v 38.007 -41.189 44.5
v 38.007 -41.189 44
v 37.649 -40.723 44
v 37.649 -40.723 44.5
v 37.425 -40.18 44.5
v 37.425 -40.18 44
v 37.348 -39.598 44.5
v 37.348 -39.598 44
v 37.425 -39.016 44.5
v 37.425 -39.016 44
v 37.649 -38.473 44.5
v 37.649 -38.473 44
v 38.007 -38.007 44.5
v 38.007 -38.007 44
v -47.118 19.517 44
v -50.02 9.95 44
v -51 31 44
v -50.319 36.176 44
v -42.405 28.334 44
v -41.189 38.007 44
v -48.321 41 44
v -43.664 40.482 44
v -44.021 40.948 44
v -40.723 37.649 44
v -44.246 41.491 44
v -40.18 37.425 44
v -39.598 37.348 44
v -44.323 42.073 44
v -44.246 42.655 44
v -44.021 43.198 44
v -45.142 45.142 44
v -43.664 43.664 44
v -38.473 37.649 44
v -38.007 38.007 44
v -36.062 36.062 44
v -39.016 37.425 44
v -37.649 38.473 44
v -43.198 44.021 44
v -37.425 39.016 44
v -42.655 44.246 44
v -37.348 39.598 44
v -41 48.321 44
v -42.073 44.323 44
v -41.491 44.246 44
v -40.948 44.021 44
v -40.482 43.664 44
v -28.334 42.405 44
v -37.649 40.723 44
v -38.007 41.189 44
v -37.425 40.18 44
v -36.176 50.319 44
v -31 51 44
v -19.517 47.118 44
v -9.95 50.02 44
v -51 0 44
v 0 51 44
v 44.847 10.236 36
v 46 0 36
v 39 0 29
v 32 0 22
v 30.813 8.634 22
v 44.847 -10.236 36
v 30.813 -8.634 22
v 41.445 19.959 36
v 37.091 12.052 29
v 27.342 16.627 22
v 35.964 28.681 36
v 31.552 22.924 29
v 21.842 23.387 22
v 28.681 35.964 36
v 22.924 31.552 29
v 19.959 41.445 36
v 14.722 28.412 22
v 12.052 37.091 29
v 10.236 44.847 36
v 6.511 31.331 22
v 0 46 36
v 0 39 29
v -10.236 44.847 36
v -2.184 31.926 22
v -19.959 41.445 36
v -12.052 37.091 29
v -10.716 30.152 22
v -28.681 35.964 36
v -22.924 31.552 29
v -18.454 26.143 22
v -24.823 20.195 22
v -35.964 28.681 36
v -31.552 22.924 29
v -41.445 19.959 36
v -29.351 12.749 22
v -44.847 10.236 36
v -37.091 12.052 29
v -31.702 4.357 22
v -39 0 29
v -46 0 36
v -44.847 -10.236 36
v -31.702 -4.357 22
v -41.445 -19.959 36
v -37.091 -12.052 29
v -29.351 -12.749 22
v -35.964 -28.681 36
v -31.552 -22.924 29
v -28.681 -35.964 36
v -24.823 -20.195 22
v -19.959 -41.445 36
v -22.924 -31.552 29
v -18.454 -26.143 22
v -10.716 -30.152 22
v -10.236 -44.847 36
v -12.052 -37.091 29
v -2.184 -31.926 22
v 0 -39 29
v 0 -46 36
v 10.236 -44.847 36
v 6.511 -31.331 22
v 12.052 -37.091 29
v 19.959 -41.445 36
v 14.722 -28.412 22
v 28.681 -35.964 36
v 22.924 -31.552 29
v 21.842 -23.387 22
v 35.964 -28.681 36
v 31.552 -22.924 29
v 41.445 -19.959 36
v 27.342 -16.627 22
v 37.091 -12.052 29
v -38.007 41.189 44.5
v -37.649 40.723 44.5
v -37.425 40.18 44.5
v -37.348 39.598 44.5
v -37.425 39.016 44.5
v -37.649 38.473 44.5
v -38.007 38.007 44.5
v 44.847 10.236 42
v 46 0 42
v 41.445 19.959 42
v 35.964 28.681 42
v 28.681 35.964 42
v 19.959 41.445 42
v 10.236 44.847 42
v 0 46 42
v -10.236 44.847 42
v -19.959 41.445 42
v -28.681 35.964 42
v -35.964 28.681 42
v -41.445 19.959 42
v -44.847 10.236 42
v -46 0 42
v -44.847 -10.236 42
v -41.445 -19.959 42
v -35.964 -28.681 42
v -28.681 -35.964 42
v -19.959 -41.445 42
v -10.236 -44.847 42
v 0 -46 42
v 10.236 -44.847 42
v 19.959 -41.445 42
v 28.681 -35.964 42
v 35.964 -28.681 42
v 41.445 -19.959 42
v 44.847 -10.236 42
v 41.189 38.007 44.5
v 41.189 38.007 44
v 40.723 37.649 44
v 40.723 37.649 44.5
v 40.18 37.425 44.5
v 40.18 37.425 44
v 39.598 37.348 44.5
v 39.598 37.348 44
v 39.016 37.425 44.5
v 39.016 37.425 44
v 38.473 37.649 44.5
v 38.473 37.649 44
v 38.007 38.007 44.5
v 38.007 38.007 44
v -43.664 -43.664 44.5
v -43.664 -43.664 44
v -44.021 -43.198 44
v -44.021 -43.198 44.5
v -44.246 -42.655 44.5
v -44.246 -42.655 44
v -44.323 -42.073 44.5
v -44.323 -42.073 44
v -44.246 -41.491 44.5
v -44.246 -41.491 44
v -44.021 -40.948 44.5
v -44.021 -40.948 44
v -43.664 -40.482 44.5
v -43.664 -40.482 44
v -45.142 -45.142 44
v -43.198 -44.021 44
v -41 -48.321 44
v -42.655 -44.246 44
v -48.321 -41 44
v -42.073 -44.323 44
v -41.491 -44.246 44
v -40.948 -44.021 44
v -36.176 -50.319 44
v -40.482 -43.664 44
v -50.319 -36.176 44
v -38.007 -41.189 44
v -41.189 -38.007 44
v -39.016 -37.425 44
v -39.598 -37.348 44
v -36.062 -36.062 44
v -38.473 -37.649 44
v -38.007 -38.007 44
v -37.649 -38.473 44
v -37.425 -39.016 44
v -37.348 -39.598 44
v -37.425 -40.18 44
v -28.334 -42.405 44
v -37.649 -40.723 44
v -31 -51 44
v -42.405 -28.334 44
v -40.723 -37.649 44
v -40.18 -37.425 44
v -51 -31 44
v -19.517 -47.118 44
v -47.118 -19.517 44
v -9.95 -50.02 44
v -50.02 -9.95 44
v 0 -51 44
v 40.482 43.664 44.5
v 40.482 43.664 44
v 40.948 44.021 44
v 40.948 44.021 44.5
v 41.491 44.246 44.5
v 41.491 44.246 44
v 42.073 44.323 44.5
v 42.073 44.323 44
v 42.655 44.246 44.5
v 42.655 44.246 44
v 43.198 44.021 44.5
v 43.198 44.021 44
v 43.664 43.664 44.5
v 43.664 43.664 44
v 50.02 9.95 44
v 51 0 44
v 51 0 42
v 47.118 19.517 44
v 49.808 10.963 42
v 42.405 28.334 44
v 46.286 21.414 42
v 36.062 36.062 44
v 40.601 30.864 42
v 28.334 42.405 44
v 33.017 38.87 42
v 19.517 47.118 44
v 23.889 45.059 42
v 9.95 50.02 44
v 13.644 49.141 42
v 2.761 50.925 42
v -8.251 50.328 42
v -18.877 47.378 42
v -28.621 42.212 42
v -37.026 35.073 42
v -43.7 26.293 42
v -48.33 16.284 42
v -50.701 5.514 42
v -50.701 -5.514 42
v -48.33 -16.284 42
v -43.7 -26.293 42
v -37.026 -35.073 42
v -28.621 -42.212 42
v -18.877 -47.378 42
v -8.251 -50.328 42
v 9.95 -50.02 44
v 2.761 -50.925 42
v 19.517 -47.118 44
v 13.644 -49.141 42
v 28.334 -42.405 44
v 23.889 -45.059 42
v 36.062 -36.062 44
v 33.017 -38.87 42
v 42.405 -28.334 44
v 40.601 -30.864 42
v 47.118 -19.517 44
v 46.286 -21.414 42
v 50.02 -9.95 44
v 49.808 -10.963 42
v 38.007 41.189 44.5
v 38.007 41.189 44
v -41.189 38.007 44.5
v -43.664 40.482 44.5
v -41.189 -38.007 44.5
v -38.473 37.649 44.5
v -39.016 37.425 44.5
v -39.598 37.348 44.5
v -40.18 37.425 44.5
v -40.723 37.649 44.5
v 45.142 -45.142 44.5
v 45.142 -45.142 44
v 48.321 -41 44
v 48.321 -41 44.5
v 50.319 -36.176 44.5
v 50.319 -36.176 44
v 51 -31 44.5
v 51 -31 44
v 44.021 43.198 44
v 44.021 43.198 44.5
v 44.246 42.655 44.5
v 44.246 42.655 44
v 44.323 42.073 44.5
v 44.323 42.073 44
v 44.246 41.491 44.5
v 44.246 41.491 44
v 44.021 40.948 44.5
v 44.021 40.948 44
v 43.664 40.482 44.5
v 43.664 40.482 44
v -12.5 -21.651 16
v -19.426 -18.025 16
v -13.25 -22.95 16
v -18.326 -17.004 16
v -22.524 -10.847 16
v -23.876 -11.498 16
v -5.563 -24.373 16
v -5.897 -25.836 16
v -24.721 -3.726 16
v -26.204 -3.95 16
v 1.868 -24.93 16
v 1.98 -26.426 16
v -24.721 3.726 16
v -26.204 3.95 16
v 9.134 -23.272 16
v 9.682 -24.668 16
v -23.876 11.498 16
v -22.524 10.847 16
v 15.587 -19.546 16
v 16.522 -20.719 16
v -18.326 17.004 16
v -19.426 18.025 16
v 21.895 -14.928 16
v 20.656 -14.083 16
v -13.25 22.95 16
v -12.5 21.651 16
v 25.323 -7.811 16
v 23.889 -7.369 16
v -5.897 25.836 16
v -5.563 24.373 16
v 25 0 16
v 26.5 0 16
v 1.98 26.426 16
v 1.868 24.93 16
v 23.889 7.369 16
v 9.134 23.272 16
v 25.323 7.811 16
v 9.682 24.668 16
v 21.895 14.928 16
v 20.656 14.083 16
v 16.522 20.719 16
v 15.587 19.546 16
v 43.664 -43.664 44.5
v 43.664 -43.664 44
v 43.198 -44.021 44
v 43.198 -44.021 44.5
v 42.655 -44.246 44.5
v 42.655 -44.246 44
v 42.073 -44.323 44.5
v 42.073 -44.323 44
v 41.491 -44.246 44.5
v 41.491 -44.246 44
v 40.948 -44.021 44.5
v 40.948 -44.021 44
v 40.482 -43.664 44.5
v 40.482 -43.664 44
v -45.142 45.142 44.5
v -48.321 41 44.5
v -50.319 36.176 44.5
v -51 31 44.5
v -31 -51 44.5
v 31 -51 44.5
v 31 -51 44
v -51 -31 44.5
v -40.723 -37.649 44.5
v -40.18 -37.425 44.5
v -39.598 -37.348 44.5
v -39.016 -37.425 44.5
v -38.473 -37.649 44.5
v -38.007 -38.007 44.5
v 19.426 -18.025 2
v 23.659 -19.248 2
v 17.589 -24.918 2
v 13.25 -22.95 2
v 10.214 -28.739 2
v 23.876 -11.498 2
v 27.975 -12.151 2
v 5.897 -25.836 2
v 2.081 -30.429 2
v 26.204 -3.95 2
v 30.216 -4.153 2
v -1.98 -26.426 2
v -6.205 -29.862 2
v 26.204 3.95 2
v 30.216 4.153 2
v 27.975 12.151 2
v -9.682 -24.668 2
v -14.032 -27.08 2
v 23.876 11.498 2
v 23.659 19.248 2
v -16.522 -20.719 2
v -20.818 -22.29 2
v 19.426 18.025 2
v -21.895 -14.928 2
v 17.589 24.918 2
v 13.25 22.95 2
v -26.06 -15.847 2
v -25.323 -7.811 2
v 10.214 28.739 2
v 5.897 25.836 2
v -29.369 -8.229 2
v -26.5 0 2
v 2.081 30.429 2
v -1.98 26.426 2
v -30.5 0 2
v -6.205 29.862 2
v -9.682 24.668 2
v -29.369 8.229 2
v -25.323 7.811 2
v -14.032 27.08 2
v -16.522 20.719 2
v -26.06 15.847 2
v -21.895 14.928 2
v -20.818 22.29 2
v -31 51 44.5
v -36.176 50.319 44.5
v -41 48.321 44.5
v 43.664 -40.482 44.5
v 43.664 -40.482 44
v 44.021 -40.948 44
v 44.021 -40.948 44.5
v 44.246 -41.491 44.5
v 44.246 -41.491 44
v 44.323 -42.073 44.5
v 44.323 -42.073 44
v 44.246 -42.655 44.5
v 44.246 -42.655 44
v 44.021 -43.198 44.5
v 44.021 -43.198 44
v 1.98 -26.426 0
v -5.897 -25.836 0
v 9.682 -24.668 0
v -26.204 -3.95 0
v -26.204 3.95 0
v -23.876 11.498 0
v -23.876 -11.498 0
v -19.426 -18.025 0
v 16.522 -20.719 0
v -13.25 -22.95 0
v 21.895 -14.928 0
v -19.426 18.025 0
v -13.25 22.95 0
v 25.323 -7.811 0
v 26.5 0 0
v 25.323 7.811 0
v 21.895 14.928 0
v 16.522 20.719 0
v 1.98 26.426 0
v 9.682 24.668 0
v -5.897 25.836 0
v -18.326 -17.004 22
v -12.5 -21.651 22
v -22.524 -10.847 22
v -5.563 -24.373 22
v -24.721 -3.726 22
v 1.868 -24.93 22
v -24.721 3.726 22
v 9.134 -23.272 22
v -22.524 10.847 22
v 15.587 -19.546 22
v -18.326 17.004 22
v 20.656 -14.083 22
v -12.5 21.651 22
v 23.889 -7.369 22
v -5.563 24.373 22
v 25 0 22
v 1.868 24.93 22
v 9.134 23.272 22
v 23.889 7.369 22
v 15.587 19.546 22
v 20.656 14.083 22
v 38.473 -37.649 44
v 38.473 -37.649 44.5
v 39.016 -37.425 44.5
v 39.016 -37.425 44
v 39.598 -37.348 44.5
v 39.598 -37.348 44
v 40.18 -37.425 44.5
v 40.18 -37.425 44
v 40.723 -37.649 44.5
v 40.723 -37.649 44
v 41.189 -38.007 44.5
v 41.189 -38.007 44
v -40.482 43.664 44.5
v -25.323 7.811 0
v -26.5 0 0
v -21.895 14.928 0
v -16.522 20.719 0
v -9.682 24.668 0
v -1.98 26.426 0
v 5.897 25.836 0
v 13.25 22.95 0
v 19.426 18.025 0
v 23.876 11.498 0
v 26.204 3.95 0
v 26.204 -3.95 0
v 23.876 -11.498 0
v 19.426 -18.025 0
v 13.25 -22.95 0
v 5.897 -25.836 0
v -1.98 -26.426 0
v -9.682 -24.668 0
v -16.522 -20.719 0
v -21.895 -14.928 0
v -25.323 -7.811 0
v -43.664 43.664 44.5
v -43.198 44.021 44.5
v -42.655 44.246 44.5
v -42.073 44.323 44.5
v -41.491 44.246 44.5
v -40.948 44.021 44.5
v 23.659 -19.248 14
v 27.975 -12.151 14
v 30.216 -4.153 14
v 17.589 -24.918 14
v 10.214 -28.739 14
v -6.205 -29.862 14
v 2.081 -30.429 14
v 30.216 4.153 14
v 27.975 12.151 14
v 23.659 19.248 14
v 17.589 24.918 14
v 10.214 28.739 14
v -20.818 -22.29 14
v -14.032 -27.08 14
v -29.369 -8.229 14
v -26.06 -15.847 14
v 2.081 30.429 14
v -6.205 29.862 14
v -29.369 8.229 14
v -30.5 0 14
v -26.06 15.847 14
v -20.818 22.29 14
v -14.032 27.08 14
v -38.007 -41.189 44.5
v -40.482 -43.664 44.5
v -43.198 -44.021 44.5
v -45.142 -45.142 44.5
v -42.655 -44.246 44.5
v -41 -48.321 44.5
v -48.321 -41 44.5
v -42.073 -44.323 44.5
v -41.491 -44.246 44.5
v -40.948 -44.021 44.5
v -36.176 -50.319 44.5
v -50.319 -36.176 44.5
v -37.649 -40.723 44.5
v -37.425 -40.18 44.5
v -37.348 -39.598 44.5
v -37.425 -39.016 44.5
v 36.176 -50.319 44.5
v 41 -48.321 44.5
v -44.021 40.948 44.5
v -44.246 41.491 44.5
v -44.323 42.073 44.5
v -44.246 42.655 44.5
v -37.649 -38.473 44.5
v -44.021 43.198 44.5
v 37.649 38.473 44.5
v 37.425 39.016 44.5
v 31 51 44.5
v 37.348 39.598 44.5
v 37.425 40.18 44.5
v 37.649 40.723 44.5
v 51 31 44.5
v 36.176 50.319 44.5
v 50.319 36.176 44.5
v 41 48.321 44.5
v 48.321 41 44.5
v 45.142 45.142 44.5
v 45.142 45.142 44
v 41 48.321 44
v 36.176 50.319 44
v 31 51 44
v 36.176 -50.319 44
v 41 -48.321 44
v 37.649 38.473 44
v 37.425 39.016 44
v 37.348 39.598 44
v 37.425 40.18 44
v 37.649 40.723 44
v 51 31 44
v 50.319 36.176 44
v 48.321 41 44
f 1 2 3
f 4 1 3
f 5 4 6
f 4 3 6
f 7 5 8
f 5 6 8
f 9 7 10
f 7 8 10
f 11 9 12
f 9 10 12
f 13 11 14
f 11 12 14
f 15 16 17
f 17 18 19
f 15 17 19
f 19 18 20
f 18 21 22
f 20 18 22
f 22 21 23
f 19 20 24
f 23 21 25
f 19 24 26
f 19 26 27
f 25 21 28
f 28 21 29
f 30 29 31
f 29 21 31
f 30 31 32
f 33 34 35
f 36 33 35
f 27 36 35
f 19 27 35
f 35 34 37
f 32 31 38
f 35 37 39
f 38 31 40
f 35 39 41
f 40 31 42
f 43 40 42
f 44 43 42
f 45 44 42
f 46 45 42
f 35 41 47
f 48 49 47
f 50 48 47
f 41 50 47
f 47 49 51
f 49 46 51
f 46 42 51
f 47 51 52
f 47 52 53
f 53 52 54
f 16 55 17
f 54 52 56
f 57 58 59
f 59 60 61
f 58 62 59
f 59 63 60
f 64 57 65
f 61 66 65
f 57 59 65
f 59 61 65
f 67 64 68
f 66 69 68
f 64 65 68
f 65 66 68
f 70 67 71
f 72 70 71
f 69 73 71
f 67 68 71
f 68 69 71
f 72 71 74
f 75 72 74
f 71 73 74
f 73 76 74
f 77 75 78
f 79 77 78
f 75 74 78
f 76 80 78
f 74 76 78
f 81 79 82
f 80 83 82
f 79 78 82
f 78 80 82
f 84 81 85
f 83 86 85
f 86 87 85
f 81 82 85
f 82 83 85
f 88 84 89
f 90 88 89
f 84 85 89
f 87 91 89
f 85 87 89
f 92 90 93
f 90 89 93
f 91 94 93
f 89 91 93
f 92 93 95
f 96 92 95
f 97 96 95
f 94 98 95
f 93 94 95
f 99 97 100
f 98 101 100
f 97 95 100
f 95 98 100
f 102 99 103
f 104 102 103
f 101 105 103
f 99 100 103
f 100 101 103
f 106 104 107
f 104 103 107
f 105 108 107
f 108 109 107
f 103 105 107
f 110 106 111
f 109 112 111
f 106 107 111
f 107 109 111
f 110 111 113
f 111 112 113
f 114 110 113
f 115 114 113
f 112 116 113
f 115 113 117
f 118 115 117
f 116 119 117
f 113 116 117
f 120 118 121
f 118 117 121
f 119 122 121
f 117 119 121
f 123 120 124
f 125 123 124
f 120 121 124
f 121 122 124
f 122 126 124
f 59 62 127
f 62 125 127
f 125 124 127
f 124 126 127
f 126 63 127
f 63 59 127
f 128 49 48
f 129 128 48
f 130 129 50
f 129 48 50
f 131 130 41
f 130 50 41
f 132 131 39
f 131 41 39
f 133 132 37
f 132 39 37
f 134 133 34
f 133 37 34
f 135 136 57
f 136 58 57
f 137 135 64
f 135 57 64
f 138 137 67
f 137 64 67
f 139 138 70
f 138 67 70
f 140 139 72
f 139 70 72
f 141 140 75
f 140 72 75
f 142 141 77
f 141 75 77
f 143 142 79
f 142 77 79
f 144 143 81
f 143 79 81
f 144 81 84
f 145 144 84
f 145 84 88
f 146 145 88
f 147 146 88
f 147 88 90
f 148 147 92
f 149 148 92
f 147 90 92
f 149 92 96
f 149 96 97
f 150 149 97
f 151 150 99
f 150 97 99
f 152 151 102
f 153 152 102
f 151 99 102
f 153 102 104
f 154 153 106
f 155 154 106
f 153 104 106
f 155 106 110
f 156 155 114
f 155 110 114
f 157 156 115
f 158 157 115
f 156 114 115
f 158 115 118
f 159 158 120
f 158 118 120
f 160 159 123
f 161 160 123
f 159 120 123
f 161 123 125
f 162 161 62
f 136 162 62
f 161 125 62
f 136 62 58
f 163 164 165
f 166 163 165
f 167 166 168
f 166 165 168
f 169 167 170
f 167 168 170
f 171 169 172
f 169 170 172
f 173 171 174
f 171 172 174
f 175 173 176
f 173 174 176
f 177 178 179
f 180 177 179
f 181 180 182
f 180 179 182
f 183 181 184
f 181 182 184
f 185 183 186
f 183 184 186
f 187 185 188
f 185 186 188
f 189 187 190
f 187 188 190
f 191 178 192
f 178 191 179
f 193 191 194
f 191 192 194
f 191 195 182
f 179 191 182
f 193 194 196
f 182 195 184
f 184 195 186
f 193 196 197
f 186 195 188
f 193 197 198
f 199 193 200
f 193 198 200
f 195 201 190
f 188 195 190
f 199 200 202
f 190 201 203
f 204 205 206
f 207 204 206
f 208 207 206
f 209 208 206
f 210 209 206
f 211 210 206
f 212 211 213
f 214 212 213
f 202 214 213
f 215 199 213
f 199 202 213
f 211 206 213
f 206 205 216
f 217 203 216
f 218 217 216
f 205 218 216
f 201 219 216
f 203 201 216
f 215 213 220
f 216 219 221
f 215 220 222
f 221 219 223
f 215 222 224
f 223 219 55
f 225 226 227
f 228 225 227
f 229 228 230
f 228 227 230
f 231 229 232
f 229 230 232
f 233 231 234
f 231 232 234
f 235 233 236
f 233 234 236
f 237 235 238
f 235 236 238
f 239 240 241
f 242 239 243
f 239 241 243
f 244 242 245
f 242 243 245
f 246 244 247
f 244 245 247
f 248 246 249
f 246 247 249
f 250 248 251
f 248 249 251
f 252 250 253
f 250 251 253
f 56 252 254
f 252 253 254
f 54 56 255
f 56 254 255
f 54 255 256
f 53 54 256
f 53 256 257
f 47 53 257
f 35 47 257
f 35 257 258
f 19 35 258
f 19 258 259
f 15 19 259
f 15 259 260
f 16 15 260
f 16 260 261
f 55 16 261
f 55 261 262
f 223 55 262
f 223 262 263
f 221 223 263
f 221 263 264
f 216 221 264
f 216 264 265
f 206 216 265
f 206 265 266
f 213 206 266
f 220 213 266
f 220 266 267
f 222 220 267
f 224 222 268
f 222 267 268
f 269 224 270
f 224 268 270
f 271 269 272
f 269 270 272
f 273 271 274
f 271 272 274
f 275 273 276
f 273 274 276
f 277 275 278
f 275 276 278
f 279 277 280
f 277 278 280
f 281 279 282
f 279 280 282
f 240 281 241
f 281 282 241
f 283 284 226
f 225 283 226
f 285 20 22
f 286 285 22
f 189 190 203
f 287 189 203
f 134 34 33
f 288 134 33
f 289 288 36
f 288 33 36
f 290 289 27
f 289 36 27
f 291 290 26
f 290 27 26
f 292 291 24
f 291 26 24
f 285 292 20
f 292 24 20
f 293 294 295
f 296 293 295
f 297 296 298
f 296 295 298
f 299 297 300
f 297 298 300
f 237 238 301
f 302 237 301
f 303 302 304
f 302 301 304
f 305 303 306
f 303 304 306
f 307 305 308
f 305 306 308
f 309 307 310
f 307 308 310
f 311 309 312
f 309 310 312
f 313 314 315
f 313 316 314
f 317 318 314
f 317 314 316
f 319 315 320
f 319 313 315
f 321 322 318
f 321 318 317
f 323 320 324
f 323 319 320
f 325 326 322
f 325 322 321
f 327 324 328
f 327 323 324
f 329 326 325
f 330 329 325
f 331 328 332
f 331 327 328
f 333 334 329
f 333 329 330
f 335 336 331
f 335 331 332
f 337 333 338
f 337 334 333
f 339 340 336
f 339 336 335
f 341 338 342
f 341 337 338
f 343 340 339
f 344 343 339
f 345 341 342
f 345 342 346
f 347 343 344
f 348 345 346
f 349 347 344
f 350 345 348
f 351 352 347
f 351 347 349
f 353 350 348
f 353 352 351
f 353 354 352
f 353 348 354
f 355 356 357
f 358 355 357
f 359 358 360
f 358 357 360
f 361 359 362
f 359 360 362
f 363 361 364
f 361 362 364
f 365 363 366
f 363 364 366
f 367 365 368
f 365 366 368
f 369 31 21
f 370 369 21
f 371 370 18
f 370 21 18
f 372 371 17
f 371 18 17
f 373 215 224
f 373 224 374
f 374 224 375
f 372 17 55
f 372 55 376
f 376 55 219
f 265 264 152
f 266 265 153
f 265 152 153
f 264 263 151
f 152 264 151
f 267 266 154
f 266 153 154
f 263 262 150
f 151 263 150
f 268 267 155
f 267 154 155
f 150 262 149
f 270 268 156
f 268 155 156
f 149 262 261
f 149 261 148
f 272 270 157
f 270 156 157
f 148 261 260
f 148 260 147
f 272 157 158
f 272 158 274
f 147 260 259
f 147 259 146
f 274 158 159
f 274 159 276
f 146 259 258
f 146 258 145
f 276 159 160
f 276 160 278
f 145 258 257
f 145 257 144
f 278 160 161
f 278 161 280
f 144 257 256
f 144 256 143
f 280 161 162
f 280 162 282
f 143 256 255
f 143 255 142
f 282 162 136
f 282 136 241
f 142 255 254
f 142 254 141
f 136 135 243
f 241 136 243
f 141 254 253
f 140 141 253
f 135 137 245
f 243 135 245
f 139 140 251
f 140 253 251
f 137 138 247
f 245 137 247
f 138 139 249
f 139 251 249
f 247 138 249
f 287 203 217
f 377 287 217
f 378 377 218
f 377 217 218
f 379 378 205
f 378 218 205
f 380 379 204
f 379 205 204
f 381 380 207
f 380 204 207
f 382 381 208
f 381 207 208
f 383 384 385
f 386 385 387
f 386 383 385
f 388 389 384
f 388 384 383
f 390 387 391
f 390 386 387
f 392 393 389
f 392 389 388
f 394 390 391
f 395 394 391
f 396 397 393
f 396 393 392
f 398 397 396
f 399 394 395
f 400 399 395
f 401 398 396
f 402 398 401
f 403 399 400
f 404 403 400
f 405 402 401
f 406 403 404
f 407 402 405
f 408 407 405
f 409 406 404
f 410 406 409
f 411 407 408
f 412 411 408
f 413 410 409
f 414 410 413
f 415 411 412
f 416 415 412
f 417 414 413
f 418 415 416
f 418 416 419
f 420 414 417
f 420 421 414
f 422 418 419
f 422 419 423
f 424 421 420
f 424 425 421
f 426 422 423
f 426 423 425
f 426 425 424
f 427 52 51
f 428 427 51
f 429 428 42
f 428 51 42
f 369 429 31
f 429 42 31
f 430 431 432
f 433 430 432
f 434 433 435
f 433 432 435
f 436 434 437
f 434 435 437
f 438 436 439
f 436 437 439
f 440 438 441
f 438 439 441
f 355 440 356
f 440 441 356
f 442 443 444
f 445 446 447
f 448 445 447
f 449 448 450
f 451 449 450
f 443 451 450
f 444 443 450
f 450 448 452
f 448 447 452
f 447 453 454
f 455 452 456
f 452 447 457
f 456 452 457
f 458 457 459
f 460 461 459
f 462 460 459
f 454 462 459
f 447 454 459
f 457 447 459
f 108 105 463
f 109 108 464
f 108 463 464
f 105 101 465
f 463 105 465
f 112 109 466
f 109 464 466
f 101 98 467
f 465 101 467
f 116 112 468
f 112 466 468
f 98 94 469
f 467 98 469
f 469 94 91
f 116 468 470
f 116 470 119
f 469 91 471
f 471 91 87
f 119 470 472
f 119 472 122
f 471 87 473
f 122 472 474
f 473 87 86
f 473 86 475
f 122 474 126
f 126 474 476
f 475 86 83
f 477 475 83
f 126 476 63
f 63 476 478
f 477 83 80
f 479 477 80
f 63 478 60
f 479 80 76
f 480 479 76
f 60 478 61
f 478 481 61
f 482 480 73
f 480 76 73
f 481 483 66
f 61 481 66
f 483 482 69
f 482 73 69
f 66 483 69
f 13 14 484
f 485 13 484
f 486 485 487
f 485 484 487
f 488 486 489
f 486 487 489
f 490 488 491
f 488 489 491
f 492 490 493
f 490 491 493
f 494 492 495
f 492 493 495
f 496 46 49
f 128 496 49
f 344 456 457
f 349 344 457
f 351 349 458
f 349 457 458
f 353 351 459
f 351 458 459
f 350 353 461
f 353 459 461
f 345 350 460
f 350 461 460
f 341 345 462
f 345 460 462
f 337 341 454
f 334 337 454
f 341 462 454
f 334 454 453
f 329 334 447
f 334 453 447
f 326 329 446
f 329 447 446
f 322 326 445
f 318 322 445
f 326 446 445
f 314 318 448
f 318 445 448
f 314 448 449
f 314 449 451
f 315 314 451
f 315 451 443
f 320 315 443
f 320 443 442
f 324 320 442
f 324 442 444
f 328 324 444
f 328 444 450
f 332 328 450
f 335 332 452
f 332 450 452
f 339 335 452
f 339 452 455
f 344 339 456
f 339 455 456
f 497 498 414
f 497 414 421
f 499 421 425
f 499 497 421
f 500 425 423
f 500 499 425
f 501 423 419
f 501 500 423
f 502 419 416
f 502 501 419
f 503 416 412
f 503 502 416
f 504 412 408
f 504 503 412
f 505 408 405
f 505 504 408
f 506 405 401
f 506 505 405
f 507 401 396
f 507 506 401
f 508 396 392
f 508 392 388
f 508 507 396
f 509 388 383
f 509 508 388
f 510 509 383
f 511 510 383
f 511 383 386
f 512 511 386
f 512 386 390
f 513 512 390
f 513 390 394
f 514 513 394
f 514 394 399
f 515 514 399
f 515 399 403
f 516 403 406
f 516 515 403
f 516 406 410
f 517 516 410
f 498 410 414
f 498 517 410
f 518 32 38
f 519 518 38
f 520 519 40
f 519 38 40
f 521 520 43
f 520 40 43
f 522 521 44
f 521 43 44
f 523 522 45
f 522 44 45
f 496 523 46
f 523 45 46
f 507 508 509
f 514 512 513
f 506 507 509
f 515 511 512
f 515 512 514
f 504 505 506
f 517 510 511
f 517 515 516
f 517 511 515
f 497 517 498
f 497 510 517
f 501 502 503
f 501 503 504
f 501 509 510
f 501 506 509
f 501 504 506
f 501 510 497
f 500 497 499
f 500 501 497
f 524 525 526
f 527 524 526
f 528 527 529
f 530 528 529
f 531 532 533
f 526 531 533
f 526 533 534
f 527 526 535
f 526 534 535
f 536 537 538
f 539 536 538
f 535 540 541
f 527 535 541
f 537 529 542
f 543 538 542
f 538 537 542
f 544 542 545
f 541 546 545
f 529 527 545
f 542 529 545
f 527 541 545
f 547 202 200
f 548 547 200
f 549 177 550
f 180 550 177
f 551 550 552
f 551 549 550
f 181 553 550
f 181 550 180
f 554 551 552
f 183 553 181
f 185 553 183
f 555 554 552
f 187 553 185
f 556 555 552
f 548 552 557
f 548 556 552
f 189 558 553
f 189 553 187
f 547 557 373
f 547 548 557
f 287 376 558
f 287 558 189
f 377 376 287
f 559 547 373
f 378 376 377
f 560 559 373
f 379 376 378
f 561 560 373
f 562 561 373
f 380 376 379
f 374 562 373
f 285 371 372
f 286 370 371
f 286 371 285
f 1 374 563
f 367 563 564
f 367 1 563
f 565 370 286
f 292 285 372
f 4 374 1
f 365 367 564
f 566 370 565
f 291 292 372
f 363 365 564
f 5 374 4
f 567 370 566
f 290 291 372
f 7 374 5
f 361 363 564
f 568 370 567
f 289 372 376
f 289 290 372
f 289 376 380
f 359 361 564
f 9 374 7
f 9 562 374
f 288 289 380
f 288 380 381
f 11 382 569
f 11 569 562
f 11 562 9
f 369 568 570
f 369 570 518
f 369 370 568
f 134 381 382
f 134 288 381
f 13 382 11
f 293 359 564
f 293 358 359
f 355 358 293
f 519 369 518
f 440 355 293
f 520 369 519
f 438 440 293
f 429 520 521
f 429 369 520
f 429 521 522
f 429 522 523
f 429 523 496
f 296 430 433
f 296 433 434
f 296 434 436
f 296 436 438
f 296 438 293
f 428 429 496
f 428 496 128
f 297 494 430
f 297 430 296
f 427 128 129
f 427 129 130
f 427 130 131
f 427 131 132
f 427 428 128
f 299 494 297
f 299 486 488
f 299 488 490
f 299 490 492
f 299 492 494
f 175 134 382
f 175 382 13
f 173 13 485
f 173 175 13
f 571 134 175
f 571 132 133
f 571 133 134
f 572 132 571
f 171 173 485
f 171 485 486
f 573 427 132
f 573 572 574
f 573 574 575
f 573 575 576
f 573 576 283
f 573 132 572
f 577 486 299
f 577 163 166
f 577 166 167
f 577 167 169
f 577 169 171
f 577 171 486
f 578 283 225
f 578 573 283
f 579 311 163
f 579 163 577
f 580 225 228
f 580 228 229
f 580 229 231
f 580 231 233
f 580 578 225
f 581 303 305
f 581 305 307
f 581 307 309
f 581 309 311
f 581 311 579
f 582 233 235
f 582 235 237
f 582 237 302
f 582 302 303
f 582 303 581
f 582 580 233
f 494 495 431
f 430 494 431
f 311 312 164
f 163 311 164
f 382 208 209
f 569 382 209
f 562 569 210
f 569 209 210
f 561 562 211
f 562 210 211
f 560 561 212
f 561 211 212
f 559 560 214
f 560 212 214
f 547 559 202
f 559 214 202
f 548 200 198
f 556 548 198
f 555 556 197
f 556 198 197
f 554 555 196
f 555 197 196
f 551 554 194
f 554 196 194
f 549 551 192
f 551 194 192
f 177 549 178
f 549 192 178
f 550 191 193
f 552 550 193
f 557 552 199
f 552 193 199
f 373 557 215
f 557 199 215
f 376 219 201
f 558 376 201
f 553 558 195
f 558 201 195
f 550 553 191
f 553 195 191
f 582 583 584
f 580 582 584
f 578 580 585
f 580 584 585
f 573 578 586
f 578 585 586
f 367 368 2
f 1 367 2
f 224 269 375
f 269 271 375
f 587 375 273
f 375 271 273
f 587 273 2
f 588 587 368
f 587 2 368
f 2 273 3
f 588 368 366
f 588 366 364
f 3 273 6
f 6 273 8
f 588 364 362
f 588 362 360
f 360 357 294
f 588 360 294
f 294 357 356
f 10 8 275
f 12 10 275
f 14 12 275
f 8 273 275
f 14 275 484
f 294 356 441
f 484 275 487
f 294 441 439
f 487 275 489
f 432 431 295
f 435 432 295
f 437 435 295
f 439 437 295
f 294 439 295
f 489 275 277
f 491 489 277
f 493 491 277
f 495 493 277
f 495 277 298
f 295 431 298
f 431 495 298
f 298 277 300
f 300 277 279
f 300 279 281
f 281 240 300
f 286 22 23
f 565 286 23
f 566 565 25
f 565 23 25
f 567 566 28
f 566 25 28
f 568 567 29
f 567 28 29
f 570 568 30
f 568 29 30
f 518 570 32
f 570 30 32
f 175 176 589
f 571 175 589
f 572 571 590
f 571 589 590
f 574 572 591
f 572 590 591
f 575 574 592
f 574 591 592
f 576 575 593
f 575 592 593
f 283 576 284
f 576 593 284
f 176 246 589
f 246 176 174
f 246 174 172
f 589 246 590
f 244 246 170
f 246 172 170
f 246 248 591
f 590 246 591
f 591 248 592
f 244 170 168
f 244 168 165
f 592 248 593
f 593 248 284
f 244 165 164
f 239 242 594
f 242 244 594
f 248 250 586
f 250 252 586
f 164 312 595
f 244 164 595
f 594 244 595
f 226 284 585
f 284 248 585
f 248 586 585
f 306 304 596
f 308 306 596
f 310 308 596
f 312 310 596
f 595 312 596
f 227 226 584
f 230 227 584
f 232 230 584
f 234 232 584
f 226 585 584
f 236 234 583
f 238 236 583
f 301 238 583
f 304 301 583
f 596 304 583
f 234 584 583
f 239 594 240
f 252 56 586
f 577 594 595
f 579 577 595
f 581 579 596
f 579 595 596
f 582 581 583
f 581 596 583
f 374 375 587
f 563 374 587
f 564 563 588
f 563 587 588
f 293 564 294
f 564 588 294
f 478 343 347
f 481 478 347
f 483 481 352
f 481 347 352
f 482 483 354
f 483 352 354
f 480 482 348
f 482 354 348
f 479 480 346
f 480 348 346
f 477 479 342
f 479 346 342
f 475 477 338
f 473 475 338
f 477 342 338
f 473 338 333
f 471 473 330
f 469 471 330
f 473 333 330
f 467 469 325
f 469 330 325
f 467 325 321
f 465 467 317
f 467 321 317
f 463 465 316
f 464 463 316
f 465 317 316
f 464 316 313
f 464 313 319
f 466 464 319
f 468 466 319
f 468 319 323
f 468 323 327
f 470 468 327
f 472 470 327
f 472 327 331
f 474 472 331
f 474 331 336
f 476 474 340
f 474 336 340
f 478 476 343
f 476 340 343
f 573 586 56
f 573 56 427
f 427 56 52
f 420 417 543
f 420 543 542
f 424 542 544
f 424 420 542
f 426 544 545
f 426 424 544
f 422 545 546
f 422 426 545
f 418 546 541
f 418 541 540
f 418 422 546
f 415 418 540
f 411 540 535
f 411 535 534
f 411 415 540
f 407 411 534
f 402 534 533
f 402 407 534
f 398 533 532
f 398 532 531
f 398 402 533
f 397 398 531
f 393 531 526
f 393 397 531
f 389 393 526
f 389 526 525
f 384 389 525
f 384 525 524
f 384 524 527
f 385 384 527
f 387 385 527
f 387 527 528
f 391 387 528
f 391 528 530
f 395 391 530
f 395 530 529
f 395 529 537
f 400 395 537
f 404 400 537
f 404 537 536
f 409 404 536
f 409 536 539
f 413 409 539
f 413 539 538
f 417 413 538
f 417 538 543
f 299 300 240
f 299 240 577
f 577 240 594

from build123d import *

# Parameters (mm, degrees)
ESQUISSE1_R             = 26.5
BOSS_EXTRU_1_DEPTH      = 16
ESQUISSE4_R             = 25
BOSS_EXTRU_2_DEPTH      = 6
ESQUISSE5_R             = 46
BOSS_EXTRU_3_DEPTH      = 14
CHANFREIN1_SIZE         = 14
ESQUISSE6_R             = 46
BOSS_EXTRU_4_DEPTH      = 6
ESQUISSE7_R             = 51
BOSS_EXTRU_5_DEPTH      = 2
BOSS_EXTRU_6_DEPTH      = 0.5
ESQUISSE9_R             = 30.5
BOSS_EXTRU_7_DEPTH      = 14
ESQUISSE10_R            = 30.5
ESQUISSE10_R_2          = 26.5
ENL_V_MAT_EXTRU_1_DEPTH = 2


with BuildPart() as part:
    # Esquisse1 → Boss.-Extru.1 (new body)
    with BuildSketch(Plane.XY):
        Circle(ESQUISSE1_R)
    extrude(amount=BOSS_EXTRU_1_DEPTH)

    # Esquisse4 → Boss.-Extru.2 (add)
    with BuildSketch(Plane.XY.offset(16)):
        Circle(ESQUISSE4_R)
    extrude(amount=BOSS_EXTRU_2_DEPTH)

    # Esquisse5 → Boss.-Extru.3 (add)
    with BuildSketch(Plane.XY.offset(22)):
        Circle(ESQUISSE5_R)
    extrude(amount=BOSS_EXTRU_3_DEPTH)

    # Chanfrein1
    chanfrein1_edges = [part.edges().sort_by_distance(p)[0] for p in [
        (-46, 0, 22),
    ]]
    chamfer(chanfrein1_edges, length=CHANFREIN1_SIZE - 0.0001)  # a hair under: the kernel refuses the full size

    # Esquisse6 → Boss.-Extru.4 (add)
    with BuildSketch(Plane.XY.offset(36)):
        Circle(ESQUISSE6_R)
    extrude(amount=BOSS_EXTRU_4_DEPTH)

    # Esquisse7 → Boss.-Extru.5 (add)
    with BuildSketch(Plane.XY.offset(42)):
        Circle(ESQUISSE7_R)
    extrude(amount=BOSS_EXTRU_5_DEPTH)

    # Esquisse8 → Boss.-Extru.6 (add)
    with BuildSketch(Plane.XY.offset(44)):
        with BuildLine():
            ThreePointArc((-51, -31), (-49.47759065, -38.653668647), (-45.142135624, -45.142135624))
            Line((-45.142135624, -45.142135624), (-43.663843738, -43.663843738))
            ThreePointArc((-43.663843738, -43.663843738), (-44.322853481, -42.072853481), (-43.663843738, -40.481863223))
            Line((-43.663843738, -40.481863223), (-41.188970004, -38.006989489))
            ThreePointArc((-41.188970004, -38.006989489), (-39.597979746, -37.347979746), (-38.006989489, -38.006989489))
            Line((-38.006989489, -38.006989489), (-36.062445841, -36.062445841))
            ThreePointArc((-36.062445841, -36.062445841), (-47.117856123, -19.516855134), (-51, -1.81e-07))
            Line((-51, -1.81e-07), (-51, -31))
        make_face()
        with BuildLine():
            Line((-43.663843738, -43.663843738), (-45.142135624, -45.142135624))
            ThreePointArc((-45.142135624, -45.142135624), (-38.653668647, -49.47759065), (-31, -51))
            Line((-31, -51), (6e-08, -51))
            ThreePointArc((6e-08, -51), (-19.516855023, -47.11785617), (-36.062445841, -36.062445841))
            Line((-36.062445841, -36.062445841), (-38.006989489, -38.006989489))
            ThreePointArc((-38.006989489, -38.006989489), (-37.347979746, -39.597979746), (-38.006989489, -41.188970004))
            Line((-38.006989489, -41.188970004), (-40.481863223, -43.663843738))
            ThreePointArc((-40.481863223, -43.663843738), (-42.072853481, -44.322853481), (-43.663843738, -43.663843738))
        make_face()
        with BuildLine():
            ThreePointArc((-36.062445841, -36.062445841), (-19.516855023, -47.11785617), (6e-08, -51))
            ThreePointArc((6e-08, -51), (19.516855078, -47.117856147), (36.062445841, -36.062445841))
            Line((36.062445841, -36.062445841), (0, 0))
            Line((0, 0), (-36.062445841, -36.062445841))
        make_face()
        with BuildLine():
            ThreePointArc((-36.062445841, 36.062445841), (-47.117856193, 19.516854967), (-51, -1.81e-07))
            ThreePointArc((-51, -1.81e-07), (-47.117856123, -19.516855134), (-36.062445841, -36.062445841))
            Line((-36.062445841, -36.062445841), (0, 0))
            Line((0, 0), (-36.062445841, 36.062445841))
        make_face()
        with BuildLine():
            Line((0, 0), (36.062445841, -36.062445841))
            ThreePointArc((36.062445841, -36.062445841), (47.117856158, -19.516855051), (51, 0))
            ThreePointArc((51, 0), (47.117856158, 19.516855051), (36.062445841, 36.062445841))
            Line((36.062445841, 36.062445841), (0, 0))
        make_face()
        with BuildLine():
            ThreePointArc((1.95e-07, 51), (-19.516854961, 47.117856195), (-36.062445841, 36.062445841))
            Line((-36.062445841, 36.062445841), (0, 0))
            Line((0, 0), (36.062445841, 36.062445841))
            ThreePointArc((36.062445841, 36.062445841), (19.516855141, 47.117856121), (1.95e-07, 51))
        make_face()
        with BuildLine():
            ThreePointArc((36.062445841, -36.062445841), (19.516855078, -47.117856147), (6e-08, -51))
            Line((6e-08, -51), (31, -51))
            ThreePointArc((31, -51), (38.653668647, -49.47759065), (45.142135624, -45.142135624))
            Line((45.142135624, -45.142135624), (43.663843738, -43.663843738))
            ThreePointArc((43.663843738, -43.663843738), (42.072853481, -44.322853481), (40.481863223, -43.663843738))
            Line((40.481863223, -43.663843738), (38.006989489, -41.188970004))
            ThreePointArc((38.006989489, -41.188970004), (37.347979746, -39.597979746), (38.006989489, -38.006989489))
            Line((38.006989489, -38.006989489), (36.062445841, -36.062445841))
        make_face()
        with BuildLine():
            ThreePointArc((51, 0), (47.117856158, -19.516855051), (36.062445841, -36.062445841))
            Line((36.062445841, -36.062445841), (38.006989489, -38.006989489))
            ThreePointArc((38.006989489, -38.006989489), (39.597979746, -37.347979746), (41.188970004, -38.006989489))
            Line((41.188970004, -38.006989489), (43.663843738, -40.481863223))
            ThreePointArc((43.663843738, -40.481863223), (44.322853481, -42.072853481), (43.663843738, -43.663843738))
            Line((43.663843738, -43.663843738), (45.142135624, -45.142135624))
            ThreePointArc((45.142135624, -45.142135624), (49.47759065, -38.653668647), (51, -31))
            Line((51, -31), (51, 0))
        make_face()
        with BuildLine():
            ThreePointArc((36.062445841, 36.062445841), (47.117856158, 19.516855051), (51, 0))
            Line((51, 0), (51, 31))
            ThreePointArc((51, 31), (49.47759065, 38.653668647), (45.142135624, 45.142135624))
            Line((45.142135624, 45.142135624), (43.663843738, 43.663843738))
            ThreePointArc((43.663843738, 43.663843738), (44.322853481, 42.072853481), (43.663843738, 40.481863223))
            Line((43.663843738, 40.481863223), (41.188970004, 38.006989489))
            ThreePointArc((41.188970004, 38.006989489), (39.597979746, 37.347979746), (38.006989489, 38.006989489))
            Line((38.006989489, 38.006989489), (36.062445841, 36.062445841))
        make_face()
        with BuildLine():
            Line((31, 51), (1.95e-07, 51))
            ThreePointArc((1.95e-07, 51), (19.516855141, 47.117856121), (36.062445841, 36.062445841))
            Line((36.062445841, 36.062445841), (38.006989489, 38.006989489))
            ThreePointArc((38.006989489, 38.006989489), (37.347979746, 39.597979746), (38.006989489, 41.188970004))
            Line((38.006989489, 41.188970004), (40.481863223, 43.663843738))
            ThreePointArc((40.481863223, 43.663843738), (42.072853481, 44.322853481), (43.663843738, 43.663843738))
            Line((43.663843738, 43.663843738), (45.142135624, 45.142135624))
            ThreePointArc((45.142135624, 45.142135624), (38.653668647, 49.47759065), (31, 51))
        make_face()
        with BuildLine():
            Line((-38.006989489, 38.006989489), (-36.062445841, 36.062445841))
            ThreePointArc((-36.062445841, 36.062445841), (-19.516854961, 47.117856195), (1.95e-07, 51))
            Line((1.95e-07, 51), (-31, 51))
            ThreePointArc((-31, 51), (-38.653668647, 49.47759065), (-45.142135624, 45.142135624))
            Line((-45.142135624, 45.142135624), (-43.663843738, 43.663843738))
            ThreePointArc((-43.663843738, 43.663843738), (-42.072853481, 44.322853481), (-40.481863223, 43.663843738))
            Line((-40.481863223, 43.663843738), (-38.006989489, 41.188970004))
            ThreePointArc((-38.006989489, 41.188970004), (-37.347979746, 39.597979746), (-38.006989489, 38.006989489))
        make_face()
        with BuildLine():
            Line((-51, 31), (-51, -1.81e-07))
            ThreePointArc((-51, -1.81e-07), (-47.117856193, 19.516854967), (-36.062445841, 36.062445841))
            Line((-36.062445841, 36.062445841), (-38.006989489, 38.006989489))
            ThreePointArc((-38.006989489, 38.006989489), (-39.597979746, 37.347979746), (-41.188970004, 38.006989489))
            Line((-41.188970004, 38.006989489), (-43.663843738, 40.481863223))
            ThreePointArc((-43.663843738, 40.481863223), (-44.322853481, 42.072853481), (-43.663843738, 43.663843738))
            Line((-43.663843738, 43.663843738), (-45.142135624, 45.142135624))
            ThreePointArc((-45.142135624, 45.142135624), (-49.47759065, 38.653668647), (-51, 31))
        make_face()
    extrude(amount=BOSS_EXTRU_6_DEPTH)


with BuildPart() as body_2:
    # Esquisse9 → Boss.-Extru.7 (new body)
    with BuildSketch(Plane(origin=(0, 0, 0), x_dir=(-1, 0, 0), z_dir=(0, 0, -1))):
        Circle(ESQUISSE9_R)
    extrude(amount=-BOSS_EXTRU_7_DEPTH)

    # Esquisse10 → Enlèv. mat.-Extru.1 (cut)
    with BuildSketch(Plane(origin=(0, 0, 0), x_dir=(-1, 0, 0), z_dir=(0, 0, -1))):
        Circle(ESQUISSE10_R)
        Circle(ESQUISSE10_R_2, mode=Mode.SUBTRACT)
    extrude(amount=-ENL_V_MAT_EXTRU_1_DEPTH, mode=Mode.SUBTRACT)


solid = Compound([part.part, body_2.part])
